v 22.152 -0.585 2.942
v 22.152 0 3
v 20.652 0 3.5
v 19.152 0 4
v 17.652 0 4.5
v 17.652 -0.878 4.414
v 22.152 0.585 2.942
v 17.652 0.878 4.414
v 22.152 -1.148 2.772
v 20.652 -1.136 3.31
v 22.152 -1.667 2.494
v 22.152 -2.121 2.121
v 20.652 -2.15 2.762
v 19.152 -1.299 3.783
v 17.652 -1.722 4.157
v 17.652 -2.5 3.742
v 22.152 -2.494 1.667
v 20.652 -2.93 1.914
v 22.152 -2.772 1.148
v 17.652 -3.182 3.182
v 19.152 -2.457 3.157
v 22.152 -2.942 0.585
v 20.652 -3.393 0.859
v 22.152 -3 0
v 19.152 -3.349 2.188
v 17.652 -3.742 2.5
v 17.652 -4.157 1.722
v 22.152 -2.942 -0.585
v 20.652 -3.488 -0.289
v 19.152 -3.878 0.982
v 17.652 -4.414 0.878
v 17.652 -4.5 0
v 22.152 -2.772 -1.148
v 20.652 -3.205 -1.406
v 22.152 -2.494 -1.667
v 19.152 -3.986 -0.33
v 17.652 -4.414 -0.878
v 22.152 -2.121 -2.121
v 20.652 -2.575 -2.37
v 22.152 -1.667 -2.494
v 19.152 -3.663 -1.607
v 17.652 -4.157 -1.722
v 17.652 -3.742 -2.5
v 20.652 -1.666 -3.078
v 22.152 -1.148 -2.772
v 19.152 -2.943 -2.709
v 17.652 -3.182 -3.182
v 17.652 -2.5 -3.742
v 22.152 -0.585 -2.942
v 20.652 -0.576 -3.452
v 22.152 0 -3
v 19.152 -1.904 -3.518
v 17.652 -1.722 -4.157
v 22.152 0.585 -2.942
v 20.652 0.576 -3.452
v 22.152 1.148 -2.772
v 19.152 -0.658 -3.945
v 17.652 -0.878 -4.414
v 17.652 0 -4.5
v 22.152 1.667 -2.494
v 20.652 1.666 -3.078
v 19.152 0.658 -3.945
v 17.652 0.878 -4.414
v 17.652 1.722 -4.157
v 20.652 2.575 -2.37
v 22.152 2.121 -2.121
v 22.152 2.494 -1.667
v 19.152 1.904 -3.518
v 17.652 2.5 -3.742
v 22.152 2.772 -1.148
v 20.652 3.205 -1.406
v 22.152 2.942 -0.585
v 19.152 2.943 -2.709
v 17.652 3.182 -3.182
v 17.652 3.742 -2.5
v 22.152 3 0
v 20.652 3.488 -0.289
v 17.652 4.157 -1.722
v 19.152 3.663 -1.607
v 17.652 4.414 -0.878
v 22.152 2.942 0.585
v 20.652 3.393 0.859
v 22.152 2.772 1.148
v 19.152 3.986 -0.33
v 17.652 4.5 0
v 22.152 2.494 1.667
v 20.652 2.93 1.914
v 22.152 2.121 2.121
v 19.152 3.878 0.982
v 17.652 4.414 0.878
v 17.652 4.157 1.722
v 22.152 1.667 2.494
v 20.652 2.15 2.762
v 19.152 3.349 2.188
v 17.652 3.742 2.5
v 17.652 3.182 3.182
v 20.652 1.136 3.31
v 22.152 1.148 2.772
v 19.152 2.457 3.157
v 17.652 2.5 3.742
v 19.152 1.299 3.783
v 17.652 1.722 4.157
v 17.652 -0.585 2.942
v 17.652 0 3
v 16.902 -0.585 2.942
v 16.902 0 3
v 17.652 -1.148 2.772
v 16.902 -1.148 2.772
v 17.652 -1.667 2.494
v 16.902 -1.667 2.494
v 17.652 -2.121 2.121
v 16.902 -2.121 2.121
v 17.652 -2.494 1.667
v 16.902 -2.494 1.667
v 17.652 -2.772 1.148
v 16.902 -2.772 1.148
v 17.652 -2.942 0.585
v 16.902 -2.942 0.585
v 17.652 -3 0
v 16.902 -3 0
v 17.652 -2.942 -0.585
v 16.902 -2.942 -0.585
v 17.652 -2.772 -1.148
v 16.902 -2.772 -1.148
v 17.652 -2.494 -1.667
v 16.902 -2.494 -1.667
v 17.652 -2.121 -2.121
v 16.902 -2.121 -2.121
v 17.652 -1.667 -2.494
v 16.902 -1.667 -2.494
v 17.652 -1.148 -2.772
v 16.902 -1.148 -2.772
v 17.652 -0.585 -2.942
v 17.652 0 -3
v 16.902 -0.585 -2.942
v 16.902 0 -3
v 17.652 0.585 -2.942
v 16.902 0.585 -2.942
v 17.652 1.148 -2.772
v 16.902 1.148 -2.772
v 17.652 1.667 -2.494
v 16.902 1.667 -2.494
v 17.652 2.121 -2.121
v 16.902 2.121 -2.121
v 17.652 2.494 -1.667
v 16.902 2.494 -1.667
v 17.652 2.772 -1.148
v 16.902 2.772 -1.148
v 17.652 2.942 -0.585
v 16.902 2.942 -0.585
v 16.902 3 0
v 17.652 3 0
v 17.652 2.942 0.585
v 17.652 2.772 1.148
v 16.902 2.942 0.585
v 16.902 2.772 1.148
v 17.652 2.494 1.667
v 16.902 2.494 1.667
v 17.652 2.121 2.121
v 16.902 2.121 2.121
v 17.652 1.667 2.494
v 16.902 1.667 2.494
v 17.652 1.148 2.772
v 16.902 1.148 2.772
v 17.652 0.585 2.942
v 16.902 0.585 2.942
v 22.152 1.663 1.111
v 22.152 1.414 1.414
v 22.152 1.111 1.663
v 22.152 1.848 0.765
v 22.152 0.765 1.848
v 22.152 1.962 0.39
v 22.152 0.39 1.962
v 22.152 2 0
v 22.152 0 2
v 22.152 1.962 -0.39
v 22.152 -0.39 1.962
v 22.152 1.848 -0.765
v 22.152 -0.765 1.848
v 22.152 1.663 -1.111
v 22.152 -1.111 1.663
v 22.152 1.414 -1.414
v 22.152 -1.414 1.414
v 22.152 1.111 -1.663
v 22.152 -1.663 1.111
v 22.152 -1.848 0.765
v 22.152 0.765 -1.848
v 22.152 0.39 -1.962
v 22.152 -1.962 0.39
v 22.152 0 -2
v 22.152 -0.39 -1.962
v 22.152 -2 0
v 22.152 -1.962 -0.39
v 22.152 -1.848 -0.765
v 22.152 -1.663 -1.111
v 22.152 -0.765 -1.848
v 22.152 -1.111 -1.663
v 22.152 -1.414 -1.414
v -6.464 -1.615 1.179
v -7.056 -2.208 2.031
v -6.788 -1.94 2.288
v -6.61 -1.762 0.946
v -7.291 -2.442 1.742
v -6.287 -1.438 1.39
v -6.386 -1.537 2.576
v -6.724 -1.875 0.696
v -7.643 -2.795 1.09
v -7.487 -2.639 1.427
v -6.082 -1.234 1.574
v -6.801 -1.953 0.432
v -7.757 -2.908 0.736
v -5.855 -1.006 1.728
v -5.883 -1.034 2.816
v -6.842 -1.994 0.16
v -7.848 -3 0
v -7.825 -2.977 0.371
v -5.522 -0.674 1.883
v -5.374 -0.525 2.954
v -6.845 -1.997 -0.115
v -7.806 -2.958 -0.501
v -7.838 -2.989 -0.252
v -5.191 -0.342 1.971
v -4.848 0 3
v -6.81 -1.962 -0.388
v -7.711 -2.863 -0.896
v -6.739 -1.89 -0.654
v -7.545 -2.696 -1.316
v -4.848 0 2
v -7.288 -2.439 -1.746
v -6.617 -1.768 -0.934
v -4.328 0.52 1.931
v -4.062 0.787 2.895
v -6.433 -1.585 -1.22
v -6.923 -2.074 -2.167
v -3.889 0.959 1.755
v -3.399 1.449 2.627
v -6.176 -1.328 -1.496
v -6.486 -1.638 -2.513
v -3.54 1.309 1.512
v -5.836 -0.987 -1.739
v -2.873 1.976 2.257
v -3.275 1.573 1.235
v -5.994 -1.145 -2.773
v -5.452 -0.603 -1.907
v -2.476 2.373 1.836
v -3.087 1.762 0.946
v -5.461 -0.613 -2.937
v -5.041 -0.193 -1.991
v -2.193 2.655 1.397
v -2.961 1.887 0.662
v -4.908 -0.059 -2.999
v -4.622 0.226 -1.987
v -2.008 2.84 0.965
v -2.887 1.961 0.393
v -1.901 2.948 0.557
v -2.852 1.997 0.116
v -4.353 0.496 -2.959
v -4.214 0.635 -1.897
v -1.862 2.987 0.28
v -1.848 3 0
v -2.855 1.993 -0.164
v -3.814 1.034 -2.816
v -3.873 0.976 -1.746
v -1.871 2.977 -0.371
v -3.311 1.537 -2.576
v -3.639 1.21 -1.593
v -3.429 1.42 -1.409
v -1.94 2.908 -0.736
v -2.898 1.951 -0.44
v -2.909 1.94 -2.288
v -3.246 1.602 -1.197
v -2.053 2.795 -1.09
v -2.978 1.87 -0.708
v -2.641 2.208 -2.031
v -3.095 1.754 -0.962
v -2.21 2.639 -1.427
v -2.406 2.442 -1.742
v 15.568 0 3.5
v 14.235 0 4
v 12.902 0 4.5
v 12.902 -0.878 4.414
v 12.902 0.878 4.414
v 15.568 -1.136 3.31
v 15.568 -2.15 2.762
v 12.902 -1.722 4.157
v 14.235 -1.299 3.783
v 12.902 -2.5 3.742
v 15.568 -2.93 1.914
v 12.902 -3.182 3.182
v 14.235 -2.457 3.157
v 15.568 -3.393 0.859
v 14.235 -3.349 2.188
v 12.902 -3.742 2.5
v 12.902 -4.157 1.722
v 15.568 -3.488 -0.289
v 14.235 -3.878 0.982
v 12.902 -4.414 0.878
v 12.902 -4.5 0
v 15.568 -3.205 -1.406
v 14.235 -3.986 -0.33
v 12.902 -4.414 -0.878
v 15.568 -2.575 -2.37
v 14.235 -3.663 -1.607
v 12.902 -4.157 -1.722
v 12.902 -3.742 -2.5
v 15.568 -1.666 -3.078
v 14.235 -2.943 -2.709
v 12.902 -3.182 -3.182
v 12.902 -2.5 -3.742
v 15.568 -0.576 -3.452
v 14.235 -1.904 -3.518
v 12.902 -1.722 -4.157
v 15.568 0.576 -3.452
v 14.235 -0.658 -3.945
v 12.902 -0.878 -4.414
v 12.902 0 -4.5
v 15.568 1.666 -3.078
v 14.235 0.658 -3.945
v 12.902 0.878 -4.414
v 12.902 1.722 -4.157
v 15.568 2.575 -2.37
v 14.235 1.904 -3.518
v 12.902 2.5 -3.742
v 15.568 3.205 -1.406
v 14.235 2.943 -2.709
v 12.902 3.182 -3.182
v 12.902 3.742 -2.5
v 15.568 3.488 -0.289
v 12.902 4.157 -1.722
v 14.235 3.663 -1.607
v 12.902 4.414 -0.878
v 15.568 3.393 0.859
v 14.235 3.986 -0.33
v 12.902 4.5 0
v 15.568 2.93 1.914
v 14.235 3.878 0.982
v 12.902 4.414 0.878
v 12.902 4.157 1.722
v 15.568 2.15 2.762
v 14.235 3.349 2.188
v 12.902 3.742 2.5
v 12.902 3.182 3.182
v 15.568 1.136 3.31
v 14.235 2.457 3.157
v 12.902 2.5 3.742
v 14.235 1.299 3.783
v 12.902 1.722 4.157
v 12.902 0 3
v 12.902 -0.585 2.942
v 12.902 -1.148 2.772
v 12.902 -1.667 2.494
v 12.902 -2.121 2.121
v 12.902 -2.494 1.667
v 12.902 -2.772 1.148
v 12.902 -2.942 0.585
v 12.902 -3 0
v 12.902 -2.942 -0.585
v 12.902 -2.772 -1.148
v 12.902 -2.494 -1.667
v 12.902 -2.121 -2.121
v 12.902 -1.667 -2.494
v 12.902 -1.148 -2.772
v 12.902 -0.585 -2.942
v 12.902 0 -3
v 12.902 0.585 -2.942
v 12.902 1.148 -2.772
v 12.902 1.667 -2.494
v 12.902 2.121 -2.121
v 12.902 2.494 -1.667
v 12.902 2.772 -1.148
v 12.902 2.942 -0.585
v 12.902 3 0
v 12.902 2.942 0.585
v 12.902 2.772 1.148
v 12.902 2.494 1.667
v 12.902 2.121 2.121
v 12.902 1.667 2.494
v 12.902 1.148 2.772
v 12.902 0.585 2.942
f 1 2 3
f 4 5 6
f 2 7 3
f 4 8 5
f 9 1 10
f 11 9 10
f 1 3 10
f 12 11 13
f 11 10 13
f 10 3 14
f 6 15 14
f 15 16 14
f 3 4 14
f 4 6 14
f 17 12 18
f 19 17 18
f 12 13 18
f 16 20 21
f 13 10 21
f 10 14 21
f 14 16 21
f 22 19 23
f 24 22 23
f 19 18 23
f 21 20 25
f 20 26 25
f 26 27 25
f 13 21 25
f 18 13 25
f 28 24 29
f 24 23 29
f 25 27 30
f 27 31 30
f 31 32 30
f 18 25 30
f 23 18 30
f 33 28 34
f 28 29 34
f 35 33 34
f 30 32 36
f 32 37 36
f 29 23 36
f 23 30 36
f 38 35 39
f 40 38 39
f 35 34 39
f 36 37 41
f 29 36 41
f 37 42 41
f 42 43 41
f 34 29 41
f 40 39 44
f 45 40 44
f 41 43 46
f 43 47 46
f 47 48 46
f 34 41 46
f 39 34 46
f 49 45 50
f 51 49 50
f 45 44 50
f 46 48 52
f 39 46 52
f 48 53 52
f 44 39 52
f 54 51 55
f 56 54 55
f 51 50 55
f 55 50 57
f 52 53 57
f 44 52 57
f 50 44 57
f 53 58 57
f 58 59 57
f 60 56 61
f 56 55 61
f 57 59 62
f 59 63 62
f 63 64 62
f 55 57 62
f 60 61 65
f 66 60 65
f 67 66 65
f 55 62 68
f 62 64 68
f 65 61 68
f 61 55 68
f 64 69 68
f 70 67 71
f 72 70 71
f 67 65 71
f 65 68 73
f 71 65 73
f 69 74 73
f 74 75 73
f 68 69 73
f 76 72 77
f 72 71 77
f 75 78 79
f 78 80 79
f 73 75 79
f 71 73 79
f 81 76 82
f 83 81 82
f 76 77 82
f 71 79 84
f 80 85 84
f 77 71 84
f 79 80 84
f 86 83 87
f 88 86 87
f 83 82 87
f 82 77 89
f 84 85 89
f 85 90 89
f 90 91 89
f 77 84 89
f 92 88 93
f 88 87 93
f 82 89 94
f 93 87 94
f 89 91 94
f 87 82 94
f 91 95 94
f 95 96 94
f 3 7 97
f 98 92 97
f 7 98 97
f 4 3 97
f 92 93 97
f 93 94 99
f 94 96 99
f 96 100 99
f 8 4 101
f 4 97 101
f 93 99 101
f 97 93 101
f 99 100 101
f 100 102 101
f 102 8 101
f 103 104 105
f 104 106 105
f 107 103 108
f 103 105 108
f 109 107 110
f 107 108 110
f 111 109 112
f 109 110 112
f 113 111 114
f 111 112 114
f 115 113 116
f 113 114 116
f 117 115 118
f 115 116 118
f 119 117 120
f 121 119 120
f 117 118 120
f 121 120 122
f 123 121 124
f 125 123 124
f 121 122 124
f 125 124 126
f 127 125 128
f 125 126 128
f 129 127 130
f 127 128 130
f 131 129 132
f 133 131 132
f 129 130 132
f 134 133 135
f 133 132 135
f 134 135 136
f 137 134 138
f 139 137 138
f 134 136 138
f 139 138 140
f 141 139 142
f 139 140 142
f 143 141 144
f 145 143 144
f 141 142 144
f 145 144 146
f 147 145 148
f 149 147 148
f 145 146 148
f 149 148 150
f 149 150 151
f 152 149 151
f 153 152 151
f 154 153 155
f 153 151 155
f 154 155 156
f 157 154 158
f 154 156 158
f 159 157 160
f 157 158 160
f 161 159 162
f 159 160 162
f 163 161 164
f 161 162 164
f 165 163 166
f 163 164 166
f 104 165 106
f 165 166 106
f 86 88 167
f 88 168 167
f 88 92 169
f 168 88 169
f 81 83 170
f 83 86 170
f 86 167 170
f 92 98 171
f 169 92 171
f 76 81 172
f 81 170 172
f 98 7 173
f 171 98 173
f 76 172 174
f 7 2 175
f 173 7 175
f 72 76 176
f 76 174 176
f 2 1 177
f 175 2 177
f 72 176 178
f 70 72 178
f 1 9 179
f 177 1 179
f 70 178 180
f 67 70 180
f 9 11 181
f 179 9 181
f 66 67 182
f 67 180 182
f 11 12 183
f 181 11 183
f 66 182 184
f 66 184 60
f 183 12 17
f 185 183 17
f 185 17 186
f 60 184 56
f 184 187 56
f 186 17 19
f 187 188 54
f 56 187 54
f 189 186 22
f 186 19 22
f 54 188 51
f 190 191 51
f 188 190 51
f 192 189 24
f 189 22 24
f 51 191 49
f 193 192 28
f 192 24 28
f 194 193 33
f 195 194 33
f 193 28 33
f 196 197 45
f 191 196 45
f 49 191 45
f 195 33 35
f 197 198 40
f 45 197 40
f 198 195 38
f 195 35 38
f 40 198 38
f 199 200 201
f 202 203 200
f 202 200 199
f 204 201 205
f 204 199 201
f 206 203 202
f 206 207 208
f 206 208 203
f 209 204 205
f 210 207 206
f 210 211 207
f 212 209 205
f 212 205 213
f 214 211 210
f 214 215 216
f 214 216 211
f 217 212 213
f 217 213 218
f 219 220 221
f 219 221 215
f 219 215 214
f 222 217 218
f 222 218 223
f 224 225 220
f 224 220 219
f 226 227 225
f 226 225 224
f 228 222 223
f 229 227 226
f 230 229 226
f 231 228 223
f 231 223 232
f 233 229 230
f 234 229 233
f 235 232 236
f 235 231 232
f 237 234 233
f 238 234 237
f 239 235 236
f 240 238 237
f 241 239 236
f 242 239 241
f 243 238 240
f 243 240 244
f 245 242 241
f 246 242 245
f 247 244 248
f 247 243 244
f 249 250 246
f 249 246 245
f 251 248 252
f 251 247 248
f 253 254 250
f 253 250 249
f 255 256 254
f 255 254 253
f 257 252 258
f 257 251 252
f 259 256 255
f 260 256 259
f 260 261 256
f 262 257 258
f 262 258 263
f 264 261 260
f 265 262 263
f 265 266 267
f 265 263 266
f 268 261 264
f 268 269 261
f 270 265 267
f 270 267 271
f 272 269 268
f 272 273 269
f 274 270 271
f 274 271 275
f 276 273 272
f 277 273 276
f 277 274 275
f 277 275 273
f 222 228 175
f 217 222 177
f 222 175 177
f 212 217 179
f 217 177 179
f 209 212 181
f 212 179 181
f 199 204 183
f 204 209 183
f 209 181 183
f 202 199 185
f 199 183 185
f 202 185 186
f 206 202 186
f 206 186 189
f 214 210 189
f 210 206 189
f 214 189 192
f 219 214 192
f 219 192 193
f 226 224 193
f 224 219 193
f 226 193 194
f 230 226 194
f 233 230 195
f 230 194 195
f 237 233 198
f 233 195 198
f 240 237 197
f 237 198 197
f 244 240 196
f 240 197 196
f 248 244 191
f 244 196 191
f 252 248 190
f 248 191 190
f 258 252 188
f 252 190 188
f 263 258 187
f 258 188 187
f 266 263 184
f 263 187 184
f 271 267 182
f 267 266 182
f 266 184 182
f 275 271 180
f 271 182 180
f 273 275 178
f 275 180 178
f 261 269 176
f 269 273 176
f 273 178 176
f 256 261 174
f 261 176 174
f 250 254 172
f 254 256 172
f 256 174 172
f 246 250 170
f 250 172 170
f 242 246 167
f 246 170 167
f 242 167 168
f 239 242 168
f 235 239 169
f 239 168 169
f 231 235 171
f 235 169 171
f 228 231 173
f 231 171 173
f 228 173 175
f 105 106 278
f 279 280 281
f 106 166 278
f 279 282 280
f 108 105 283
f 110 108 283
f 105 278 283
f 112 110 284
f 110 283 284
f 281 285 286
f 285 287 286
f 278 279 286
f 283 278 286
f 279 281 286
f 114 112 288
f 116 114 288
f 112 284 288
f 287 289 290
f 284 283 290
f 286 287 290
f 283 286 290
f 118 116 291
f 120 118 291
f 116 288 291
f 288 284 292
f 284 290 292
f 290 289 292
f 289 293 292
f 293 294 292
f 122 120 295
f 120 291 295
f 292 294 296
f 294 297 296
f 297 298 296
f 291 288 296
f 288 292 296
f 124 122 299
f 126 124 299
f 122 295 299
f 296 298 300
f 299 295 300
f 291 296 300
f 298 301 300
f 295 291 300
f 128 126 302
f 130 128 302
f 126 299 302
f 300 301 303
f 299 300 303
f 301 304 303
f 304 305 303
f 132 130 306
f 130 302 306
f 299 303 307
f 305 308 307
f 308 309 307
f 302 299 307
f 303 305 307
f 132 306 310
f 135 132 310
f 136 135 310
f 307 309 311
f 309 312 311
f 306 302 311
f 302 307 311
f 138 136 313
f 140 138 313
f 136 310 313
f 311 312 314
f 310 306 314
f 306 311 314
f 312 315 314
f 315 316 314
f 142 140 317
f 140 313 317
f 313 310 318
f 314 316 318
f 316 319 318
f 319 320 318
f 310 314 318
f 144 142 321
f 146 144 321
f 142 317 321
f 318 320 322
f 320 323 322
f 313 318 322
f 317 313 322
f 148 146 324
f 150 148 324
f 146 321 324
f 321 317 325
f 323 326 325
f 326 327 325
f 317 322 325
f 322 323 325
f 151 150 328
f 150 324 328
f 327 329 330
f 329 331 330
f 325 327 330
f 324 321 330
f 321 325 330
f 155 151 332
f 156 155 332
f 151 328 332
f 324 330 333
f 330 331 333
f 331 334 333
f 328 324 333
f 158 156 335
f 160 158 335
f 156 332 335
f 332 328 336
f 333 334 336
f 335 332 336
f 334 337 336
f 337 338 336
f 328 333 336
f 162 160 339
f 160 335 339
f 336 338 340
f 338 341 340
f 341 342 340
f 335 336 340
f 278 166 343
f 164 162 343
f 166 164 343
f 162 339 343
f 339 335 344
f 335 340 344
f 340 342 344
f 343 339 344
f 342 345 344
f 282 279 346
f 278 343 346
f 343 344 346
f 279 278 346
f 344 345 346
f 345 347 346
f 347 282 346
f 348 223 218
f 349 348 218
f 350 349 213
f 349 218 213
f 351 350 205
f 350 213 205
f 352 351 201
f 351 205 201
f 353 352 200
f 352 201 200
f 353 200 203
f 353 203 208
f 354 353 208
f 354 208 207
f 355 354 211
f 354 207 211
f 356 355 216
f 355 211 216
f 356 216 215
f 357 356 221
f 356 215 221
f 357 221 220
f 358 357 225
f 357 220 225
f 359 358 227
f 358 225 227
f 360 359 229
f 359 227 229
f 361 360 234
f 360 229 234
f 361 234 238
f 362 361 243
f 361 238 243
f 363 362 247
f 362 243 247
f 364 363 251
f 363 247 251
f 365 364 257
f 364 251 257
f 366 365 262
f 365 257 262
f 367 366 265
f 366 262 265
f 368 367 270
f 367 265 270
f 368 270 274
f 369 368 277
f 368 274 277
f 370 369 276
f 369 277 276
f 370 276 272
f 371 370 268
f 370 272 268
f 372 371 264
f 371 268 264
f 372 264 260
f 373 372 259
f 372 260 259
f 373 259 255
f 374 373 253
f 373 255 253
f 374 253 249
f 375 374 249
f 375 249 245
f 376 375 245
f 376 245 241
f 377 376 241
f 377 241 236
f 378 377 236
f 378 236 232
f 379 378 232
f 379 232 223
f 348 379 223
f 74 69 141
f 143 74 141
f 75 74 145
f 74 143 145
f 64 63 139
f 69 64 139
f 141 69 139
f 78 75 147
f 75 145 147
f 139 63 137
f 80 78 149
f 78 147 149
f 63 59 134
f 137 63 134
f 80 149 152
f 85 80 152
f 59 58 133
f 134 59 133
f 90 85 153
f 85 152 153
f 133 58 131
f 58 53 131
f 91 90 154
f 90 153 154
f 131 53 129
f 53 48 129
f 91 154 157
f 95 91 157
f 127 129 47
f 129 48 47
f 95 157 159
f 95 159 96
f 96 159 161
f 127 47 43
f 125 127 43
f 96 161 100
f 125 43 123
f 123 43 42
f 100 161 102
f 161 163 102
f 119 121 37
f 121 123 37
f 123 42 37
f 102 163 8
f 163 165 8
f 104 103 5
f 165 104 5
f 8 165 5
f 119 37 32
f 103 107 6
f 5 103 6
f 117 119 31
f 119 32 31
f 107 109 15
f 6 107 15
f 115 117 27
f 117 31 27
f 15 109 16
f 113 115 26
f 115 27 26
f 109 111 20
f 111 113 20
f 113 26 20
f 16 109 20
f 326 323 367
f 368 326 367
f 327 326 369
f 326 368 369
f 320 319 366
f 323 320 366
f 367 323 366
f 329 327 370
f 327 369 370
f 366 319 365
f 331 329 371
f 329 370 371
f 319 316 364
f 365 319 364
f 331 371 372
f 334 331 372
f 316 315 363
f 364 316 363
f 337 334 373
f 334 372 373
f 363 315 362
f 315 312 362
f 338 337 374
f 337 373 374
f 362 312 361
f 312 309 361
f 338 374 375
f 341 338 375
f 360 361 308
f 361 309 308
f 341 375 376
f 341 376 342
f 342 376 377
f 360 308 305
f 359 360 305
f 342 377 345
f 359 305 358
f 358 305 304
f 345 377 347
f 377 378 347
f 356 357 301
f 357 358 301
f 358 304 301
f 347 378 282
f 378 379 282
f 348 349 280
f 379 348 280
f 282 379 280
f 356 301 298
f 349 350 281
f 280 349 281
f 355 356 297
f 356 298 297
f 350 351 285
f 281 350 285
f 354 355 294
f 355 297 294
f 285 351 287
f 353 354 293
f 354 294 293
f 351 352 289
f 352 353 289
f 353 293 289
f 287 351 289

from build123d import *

# Parameters (mm, degrees)
CUT_EXTRUDE1_DEPTH      = 10
CUT_EXTRUDE1_DEPTH_BACK = 10


with BuildPart() as part:
    # Sketch1 → Revolve1 (revolve)
    with BuildSketch(Plane.XY):
        Polygon((22.151518872, 3), (17.651518872, 4.5), (17.651518872, 3), (16.901518872, 3), (12.901518872, 4.5), (12.901518872, 3), (-7.848481128, 3), (-7.848481128, 2), (22.151518872, 2), align=None)
    revolve(axis=Axis((0, 0, 0), (1, 0, 0)))

    # Sketch2 → Cut-Extrude1 (cut, two sides: drawn at the far end of the back side and taken through both)
    with BuildSketch(Plane.XY.offset(-CUT_EXTRUDE1_DEPTH_BACK)):
        Polygon((-7.848481128, -3), (-1.848481128, 3), (-7.848481128, 3), align=None)
    extrude(amount=CUT_EXTRUDE1_DEPTH + CUT_EXTRUDE1_DEPTH_BACK, mode=Mode.SUBTRACT)


solid = part.part
